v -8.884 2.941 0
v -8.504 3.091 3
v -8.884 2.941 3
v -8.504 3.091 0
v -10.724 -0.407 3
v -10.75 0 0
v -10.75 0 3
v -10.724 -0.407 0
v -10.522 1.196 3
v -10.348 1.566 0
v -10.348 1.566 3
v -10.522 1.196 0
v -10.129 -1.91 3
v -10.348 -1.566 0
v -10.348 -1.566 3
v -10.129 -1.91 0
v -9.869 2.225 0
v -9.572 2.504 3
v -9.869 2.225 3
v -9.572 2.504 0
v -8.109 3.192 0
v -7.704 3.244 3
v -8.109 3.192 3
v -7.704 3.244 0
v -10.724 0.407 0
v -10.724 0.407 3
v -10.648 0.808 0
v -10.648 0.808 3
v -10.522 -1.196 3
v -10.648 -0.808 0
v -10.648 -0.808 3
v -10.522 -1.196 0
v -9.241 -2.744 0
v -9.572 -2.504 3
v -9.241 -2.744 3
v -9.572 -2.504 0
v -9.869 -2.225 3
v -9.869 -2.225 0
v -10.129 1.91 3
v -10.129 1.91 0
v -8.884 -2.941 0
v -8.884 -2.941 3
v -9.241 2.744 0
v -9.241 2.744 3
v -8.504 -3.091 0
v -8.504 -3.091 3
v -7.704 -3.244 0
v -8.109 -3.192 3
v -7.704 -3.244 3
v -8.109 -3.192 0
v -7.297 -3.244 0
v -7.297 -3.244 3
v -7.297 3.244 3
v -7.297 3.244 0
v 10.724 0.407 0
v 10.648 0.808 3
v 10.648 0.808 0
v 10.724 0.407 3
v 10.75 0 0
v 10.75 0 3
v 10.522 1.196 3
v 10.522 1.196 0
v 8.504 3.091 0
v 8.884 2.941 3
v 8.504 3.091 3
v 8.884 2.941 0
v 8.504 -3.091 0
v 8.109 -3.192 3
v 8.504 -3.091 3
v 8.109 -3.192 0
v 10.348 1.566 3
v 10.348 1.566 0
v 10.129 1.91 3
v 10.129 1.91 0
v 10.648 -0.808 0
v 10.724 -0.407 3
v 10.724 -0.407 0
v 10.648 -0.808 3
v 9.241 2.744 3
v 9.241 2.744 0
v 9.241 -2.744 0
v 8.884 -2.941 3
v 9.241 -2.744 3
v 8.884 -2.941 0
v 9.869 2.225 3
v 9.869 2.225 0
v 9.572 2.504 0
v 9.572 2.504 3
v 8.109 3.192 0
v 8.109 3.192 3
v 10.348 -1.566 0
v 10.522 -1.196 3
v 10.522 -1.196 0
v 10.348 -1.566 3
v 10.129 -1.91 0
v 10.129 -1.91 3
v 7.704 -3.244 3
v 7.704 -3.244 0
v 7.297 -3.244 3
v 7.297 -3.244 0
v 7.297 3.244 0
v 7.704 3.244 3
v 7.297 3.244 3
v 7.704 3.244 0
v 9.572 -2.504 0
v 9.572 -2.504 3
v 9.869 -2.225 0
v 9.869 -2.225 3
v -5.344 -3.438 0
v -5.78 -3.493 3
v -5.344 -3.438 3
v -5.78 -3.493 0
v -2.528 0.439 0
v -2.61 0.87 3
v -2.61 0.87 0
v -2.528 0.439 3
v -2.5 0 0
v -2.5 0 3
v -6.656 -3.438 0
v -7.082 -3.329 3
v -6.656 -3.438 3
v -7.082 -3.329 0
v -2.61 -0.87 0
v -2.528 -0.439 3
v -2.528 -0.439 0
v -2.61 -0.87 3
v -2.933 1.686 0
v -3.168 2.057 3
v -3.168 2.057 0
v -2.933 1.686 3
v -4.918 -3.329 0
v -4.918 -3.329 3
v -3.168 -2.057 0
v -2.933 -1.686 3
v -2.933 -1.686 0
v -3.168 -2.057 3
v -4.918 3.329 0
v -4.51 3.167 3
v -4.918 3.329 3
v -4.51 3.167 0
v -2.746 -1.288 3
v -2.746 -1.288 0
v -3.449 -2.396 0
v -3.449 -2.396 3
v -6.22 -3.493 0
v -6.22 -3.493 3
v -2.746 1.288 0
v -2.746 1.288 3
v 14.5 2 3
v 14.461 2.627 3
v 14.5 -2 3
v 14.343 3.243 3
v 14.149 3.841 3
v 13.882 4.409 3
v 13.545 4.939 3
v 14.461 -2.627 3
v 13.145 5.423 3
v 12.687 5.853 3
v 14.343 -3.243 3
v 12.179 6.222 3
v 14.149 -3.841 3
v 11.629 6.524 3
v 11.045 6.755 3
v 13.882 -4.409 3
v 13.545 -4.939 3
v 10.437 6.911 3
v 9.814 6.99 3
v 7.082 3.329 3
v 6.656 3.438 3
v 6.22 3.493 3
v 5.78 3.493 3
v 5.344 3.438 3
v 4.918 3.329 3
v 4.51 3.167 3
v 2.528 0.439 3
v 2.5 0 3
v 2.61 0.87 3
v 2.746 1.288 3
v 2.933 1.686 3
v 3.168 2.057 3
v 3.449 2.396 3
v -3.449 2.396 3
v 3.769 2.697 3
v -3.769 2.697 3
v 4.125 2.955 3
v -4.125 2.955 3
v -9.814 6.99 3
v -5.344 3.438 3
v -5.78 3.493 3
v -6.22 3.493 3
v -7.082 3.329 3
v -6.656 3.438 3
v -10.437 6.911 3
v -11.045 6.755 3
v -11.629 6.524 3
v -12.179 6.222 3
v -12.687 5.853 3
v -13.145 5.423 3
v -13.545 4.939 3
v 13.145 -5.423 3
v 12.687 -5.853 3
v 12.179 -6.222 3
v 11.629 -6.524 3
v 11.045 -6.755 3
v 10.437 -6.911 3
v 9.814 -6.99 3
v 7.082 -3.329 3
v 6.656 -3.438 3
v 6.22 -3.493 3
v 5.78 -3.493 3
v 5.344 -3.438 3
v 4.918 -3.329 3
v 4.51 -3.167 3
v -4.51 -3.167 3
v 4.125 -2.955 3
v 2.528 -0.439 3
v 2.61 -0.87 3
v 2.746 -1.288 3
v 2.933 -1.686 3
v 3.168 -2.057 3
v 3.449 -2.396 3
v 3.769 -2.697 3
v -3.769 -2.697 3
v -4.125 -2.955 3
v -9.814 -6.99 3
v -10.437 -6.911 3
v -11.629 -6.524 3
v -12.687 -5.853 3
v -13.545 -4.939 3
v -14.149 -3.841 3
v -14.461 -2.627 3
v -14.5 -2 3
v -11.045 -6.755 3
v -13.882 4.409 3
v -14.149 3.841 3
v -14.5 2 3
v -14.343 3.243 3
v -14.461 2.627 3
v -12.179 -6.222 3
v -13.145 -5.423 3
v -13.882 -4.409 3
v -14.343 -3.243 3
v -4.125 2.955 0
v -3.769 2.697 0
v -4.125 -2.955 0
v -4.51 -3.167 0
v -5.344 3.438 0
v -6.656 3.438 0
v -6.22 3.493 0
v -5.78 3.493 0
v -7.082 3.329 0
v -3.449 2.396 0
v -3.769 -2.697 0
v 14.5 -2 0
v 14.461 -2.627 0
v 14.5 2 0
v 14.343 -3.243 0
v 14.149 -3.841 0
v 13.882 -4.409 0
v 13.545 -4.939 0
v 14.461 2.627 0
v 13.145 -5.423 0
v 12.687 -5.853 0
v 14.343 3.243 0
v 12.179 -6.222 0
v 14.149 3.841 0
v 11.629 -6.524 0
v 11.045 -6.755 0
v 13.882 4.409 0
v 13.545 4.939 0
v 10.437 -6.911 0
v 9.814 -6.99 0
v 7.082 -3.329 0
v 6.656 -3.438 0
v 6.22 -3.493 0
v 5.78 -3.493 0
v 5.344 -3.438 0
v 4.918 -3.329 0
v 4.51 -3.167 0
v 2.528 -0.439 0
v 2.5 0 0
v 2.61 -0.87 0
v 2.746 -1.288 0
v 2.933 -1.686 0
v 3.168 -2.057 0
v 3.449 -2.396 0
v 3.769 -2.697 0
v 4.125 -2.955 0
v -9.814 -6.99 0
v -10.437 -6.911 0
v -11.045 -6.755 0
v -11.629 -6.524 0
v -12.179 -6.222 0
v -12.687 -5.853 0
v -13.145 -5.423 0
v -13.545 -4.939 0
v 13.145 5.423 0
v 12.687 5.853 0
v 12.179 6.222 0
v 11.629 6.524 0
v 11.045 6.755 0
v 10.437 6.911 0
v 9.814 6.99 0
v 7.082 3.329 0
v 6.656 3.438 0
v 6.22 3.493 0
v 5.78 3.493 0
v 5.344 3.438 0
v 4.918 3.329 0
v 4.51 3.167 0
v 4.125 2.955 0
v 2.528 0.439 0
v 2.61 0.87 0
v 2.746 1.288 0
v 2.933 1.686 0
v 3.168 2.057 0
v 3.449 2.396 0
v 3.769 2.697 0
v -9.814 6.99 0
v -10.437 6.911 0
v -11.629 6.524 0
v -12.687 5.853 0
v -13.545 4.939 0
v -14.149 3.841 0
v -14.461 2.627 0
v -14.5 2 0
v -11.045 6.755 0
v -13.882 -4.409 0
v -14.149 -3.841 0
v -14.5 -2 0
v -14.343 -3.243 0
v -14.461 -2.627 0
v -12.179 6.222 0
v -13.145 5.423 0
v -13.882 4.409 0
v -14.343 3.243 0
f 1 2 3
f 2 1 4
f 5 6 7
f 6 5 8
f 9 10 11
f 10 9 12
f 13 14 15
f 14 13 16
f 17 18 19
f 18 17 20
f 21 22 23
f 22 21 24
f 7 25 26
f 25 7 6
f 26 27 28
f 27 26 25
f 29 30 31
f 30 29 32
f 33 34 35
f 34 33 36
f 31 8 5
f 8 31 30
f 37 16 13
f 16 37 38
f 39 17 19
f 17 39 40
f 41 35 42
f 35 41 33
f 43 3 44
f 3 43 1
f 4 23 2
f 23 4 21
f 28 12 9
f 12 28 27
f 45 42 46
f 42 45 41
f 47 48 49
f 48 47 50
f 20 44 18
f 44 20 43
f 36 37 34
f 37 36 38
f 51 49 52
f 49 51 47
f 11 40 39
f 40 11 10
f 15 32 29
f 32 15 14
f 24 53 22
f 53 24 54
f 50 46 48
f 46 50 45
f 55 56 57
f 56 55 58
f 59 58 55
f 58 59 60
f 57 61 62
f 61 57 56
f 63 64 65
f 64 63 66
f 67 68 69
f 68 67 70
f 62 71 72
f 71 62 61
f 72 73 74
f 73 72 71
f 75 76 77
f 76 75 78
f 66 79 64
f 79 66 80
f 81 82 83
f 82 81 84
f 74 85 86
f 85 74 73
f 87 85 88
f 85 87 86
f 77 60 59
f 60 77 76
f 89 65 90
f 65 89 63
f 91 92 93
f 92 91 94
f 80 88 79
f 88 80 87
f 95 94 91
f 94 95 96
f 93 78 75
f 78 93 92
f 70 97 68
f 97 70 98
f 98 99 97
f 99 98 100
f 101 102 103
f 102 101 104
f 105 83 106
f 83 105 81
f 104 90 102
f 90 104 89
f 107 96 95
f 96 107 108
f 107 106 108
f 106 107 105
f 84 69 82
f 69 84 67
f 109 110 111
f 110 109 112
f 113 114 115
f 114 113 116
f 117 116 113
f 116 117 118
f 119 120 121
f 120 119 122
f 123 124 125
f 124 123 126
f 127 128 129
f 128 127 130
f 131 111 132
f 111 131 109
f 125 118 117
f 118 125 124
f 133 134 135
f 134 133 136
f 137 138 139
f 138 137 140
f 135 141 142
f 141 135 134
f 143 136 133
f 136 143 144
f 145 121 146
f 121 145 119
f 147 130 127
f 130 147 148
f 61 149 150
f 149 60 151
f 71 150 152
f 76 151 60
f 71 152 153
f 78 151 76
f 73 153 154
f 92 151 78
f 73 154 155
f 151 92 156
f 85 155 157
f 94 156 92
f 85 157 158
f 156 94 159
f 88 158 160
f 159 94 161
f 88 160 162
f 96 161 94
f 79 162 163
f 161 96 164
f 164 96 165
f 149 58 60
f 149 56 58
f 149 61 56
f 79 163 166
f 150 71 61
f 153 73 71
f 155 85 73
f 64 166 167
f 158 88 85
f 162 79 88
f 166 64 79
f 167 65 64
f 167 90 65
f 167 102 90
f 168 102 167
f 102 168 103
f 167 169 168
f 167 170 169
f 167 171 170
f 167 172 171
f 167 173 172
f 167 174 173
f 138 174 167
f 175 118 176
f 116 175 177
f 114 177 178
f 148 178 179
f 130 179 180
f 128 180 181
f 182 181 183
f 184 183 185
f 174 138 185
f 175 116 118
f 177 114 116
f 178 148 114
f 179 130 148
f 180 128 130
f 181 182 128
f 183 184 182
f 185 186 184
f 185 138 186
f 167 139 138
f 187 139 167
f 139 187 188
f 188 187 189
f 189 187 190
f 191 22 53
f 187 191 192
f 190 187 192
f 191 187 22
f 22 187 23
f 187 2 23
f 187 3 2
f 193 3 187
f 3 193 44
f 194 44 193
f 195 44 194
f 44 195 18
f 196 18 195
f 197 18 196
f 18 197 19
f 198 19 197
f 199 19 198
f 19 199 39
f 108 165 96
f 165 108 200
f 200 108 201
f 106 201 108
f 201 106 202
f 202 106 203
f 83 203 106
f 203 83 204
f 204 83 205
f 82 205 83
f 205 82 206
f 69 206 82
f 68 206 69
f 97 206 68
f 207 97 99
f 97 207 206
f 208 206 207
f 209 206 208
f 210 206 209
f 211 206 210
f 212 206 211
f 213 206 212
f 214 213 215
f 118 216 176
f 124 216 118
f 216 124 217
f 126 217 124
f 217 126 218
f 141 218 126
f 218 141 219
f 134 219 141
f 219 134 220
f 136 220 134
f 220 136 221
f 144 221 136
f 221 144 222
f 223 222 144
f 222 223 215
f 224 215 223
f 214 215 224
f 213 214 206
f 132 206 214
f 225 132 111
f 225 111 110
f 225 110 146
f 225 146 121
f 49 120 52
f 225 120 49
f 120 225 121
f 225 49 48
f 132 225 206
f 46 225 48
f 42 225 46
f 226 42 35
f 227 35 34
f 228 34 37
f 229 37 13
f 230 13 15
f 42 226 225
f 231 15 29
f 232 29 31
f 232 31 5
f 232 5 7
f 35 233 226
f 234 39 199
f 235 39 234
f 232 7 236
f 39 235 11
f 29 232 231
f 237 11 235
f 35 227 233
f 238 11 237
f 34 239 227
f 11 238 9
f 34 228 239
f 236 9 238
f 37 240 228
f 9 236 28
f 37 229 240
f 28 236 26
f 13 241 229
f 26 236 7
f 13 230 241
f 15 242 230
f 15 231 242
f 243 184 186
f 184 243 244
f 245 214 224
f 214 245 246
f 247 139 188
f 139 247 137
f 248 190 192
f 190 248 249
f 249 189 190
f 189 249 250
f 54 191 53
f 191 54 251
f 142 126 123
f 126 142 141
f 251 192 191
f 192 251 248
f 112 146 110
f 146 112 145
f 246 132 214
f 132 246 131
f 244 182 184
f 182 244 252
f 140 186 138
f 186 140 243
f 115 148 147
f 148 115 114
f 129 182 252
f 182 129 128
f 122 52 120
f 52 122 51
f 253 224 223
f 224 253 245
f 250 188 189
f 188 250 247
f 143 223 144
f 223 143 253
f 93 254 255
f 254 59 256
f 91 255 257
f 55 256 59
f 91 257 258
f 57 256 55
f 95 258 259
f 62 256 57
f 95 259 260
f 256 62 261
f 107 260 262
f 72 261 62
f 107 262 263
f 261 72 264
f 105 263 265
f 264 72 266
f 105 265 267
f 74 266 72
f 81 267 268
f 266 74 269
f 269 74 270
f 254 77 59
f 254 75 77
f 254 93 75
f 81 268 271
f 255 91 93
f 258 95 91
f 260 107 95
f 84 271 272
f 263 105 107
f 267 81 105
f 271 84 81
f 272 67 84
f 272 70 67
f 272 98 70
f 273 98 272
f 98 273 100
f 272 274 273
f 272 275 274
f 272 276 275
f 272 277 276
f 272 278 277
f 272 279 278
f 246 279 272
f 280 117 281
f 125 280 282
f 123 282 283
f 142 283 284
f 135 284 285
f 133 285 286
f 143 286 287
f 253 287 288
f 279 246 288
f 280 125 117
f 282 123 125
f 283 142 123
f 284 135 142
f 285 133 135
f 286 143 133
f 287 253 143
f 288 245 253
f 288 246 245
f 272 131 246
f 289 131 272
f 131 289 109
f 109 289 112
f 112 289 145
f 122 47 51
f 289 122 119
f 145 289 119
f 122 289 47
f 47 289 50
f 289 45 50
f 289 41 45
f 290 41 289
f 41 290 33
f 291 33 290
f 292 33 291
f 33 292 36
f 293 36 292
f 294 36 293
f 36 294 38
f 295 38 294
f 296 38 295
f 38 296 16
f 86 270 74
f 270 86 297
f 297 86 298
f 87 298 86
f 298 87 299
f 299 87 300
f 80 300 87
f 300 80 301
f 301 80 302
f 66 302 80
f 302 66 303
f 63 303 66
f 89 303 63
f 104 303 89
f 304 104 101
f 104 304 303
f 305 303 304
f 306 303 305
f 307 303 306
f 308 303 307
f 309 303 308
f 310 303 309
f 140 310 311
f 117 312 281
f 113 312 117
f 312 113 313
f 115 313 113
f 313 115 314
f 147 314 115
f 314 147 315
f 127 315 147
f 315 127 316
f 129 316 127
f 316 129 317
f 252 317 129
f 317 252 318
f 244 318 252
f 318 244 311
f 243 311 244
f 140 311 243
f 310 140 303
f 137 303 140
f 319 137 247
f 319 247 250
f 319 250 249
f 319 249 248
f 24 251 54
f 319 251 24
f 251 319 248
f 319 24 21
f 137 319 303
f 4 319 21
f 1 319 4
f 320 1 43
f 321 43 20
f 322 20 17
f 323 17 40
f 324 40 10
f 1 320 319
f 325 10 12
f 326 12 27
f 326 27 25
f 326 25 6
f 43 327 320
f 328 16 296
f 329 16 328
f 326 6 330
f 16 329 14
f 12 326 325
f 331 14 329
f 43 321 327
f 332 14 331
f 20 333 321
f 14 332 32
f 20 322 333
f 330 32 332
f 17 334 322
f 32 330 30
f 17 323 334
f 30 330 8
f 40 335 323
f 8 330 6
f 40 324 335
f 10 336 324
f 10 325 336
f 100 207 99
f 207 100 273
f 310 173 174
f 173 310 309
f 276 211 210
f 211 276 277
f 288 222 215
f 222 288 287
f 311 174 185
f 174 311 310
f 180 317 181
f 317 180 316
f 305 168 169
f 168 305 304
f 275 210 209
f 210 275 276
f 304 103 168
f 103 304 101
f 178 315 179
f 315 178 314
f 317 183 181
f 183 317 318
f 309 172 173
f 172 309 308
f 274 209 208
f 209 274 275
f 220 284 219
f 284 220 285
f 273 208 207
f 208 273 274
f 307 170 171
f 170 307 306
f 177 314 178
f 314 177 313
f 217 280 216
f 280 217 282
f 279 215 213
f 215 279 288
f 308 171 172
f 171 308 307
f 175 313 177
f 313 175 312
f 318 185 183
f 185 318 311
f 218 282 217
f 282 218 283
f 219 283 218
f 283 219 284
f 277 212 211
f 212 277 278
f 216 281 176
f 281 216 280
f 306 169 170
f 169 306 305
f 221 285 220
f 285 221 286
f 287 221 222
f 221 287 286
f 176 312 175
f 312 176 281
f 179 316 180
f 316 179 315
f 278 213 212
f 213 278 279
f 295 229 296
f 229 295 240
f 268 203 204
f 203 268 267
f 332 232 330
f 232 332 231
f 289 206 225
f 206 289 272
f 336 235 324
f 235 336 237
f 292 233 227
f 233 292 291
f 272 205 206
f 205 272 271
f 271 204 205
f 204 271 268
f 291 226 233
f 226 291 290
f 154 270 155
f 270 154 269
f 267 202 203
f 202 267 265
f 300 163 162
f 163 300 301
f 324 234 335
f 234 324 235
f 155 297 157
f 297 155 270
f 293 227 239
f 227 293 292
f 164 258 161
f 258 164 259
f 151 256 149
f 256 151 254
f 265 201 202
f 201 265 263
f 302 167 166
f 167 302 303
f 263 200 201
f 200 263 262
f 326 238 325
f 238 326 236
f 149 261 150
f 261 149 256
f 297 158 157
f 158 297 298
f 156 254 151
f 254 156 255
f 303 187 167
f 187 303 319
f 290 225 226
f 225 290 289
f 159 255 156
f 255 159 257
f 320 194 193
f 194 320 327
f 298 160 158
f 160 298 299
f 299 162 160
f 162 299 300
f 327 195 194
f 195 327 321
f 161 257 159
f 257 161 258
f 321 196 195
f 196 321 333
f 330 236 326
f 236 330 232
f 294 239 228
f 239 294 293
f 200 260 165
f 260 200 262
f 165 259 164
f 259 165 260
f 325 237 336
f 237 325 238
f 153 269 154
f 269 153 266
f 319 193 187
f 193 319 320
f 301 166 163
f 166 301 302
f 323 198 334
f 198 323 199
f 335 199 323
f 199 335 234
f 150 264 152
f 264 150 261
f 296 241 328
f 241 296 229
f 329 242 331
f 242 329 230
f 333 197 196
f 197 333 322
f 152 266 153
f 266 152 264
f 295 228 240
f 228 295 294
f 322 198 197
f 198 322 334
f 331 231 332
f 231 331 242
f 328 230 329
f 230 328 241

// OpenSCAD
$fn = 50;


difference() {
	union() {
		hull() {
			translate(v = [-9.5000000000, 2.0000000000, 0]) {
				cylinder(h = 3, r = 5);
			}
			translate(v = [9.5000000000, 2.0000000000, 0]) {
				cylinder(h = 3, r = 5);
			}
			translate(v = [-9.5000000000, -2.0000000000, 0]) {
				cylinder(h = 3, r = 5);
			}
			translate(v = [9.5000000000, -2.0000000000, 0]) {
				cylinder(h = 3, r = 5);
			}
		}
	}
	union() {
		#translate(v = [-7.5000000000, 0.0000000000, -100.0000000000]) {
			cylinder(h = 200, r = 3.2500000000);
		}
		#translate(v = [-7.5000000000, 0.0000000000, -100.0000000000]) {
			cylinder(h = 200, r = 3.2500000000);
		}
		#translate(v = [7.5000000000, 0.0000000000, -100.0000000000]) {
			cylinder(h = 200, r = 3.2500000000);
		}
		#translate(v = [7.5000000000, 0.0000000000, -100.0000000000]) {
			cylinder(h = 200, r = 3.2500000000);
		}
		#translate(v = [-6.0000000000, 0, 0]) {
			cylinder(h = 3, r = 3.5000000000);
		}
		#translate(v = [6.0000000000, 0, 0]) {
			cylinder(h = 3, r = 3.5000000000);
		}
	}
}
